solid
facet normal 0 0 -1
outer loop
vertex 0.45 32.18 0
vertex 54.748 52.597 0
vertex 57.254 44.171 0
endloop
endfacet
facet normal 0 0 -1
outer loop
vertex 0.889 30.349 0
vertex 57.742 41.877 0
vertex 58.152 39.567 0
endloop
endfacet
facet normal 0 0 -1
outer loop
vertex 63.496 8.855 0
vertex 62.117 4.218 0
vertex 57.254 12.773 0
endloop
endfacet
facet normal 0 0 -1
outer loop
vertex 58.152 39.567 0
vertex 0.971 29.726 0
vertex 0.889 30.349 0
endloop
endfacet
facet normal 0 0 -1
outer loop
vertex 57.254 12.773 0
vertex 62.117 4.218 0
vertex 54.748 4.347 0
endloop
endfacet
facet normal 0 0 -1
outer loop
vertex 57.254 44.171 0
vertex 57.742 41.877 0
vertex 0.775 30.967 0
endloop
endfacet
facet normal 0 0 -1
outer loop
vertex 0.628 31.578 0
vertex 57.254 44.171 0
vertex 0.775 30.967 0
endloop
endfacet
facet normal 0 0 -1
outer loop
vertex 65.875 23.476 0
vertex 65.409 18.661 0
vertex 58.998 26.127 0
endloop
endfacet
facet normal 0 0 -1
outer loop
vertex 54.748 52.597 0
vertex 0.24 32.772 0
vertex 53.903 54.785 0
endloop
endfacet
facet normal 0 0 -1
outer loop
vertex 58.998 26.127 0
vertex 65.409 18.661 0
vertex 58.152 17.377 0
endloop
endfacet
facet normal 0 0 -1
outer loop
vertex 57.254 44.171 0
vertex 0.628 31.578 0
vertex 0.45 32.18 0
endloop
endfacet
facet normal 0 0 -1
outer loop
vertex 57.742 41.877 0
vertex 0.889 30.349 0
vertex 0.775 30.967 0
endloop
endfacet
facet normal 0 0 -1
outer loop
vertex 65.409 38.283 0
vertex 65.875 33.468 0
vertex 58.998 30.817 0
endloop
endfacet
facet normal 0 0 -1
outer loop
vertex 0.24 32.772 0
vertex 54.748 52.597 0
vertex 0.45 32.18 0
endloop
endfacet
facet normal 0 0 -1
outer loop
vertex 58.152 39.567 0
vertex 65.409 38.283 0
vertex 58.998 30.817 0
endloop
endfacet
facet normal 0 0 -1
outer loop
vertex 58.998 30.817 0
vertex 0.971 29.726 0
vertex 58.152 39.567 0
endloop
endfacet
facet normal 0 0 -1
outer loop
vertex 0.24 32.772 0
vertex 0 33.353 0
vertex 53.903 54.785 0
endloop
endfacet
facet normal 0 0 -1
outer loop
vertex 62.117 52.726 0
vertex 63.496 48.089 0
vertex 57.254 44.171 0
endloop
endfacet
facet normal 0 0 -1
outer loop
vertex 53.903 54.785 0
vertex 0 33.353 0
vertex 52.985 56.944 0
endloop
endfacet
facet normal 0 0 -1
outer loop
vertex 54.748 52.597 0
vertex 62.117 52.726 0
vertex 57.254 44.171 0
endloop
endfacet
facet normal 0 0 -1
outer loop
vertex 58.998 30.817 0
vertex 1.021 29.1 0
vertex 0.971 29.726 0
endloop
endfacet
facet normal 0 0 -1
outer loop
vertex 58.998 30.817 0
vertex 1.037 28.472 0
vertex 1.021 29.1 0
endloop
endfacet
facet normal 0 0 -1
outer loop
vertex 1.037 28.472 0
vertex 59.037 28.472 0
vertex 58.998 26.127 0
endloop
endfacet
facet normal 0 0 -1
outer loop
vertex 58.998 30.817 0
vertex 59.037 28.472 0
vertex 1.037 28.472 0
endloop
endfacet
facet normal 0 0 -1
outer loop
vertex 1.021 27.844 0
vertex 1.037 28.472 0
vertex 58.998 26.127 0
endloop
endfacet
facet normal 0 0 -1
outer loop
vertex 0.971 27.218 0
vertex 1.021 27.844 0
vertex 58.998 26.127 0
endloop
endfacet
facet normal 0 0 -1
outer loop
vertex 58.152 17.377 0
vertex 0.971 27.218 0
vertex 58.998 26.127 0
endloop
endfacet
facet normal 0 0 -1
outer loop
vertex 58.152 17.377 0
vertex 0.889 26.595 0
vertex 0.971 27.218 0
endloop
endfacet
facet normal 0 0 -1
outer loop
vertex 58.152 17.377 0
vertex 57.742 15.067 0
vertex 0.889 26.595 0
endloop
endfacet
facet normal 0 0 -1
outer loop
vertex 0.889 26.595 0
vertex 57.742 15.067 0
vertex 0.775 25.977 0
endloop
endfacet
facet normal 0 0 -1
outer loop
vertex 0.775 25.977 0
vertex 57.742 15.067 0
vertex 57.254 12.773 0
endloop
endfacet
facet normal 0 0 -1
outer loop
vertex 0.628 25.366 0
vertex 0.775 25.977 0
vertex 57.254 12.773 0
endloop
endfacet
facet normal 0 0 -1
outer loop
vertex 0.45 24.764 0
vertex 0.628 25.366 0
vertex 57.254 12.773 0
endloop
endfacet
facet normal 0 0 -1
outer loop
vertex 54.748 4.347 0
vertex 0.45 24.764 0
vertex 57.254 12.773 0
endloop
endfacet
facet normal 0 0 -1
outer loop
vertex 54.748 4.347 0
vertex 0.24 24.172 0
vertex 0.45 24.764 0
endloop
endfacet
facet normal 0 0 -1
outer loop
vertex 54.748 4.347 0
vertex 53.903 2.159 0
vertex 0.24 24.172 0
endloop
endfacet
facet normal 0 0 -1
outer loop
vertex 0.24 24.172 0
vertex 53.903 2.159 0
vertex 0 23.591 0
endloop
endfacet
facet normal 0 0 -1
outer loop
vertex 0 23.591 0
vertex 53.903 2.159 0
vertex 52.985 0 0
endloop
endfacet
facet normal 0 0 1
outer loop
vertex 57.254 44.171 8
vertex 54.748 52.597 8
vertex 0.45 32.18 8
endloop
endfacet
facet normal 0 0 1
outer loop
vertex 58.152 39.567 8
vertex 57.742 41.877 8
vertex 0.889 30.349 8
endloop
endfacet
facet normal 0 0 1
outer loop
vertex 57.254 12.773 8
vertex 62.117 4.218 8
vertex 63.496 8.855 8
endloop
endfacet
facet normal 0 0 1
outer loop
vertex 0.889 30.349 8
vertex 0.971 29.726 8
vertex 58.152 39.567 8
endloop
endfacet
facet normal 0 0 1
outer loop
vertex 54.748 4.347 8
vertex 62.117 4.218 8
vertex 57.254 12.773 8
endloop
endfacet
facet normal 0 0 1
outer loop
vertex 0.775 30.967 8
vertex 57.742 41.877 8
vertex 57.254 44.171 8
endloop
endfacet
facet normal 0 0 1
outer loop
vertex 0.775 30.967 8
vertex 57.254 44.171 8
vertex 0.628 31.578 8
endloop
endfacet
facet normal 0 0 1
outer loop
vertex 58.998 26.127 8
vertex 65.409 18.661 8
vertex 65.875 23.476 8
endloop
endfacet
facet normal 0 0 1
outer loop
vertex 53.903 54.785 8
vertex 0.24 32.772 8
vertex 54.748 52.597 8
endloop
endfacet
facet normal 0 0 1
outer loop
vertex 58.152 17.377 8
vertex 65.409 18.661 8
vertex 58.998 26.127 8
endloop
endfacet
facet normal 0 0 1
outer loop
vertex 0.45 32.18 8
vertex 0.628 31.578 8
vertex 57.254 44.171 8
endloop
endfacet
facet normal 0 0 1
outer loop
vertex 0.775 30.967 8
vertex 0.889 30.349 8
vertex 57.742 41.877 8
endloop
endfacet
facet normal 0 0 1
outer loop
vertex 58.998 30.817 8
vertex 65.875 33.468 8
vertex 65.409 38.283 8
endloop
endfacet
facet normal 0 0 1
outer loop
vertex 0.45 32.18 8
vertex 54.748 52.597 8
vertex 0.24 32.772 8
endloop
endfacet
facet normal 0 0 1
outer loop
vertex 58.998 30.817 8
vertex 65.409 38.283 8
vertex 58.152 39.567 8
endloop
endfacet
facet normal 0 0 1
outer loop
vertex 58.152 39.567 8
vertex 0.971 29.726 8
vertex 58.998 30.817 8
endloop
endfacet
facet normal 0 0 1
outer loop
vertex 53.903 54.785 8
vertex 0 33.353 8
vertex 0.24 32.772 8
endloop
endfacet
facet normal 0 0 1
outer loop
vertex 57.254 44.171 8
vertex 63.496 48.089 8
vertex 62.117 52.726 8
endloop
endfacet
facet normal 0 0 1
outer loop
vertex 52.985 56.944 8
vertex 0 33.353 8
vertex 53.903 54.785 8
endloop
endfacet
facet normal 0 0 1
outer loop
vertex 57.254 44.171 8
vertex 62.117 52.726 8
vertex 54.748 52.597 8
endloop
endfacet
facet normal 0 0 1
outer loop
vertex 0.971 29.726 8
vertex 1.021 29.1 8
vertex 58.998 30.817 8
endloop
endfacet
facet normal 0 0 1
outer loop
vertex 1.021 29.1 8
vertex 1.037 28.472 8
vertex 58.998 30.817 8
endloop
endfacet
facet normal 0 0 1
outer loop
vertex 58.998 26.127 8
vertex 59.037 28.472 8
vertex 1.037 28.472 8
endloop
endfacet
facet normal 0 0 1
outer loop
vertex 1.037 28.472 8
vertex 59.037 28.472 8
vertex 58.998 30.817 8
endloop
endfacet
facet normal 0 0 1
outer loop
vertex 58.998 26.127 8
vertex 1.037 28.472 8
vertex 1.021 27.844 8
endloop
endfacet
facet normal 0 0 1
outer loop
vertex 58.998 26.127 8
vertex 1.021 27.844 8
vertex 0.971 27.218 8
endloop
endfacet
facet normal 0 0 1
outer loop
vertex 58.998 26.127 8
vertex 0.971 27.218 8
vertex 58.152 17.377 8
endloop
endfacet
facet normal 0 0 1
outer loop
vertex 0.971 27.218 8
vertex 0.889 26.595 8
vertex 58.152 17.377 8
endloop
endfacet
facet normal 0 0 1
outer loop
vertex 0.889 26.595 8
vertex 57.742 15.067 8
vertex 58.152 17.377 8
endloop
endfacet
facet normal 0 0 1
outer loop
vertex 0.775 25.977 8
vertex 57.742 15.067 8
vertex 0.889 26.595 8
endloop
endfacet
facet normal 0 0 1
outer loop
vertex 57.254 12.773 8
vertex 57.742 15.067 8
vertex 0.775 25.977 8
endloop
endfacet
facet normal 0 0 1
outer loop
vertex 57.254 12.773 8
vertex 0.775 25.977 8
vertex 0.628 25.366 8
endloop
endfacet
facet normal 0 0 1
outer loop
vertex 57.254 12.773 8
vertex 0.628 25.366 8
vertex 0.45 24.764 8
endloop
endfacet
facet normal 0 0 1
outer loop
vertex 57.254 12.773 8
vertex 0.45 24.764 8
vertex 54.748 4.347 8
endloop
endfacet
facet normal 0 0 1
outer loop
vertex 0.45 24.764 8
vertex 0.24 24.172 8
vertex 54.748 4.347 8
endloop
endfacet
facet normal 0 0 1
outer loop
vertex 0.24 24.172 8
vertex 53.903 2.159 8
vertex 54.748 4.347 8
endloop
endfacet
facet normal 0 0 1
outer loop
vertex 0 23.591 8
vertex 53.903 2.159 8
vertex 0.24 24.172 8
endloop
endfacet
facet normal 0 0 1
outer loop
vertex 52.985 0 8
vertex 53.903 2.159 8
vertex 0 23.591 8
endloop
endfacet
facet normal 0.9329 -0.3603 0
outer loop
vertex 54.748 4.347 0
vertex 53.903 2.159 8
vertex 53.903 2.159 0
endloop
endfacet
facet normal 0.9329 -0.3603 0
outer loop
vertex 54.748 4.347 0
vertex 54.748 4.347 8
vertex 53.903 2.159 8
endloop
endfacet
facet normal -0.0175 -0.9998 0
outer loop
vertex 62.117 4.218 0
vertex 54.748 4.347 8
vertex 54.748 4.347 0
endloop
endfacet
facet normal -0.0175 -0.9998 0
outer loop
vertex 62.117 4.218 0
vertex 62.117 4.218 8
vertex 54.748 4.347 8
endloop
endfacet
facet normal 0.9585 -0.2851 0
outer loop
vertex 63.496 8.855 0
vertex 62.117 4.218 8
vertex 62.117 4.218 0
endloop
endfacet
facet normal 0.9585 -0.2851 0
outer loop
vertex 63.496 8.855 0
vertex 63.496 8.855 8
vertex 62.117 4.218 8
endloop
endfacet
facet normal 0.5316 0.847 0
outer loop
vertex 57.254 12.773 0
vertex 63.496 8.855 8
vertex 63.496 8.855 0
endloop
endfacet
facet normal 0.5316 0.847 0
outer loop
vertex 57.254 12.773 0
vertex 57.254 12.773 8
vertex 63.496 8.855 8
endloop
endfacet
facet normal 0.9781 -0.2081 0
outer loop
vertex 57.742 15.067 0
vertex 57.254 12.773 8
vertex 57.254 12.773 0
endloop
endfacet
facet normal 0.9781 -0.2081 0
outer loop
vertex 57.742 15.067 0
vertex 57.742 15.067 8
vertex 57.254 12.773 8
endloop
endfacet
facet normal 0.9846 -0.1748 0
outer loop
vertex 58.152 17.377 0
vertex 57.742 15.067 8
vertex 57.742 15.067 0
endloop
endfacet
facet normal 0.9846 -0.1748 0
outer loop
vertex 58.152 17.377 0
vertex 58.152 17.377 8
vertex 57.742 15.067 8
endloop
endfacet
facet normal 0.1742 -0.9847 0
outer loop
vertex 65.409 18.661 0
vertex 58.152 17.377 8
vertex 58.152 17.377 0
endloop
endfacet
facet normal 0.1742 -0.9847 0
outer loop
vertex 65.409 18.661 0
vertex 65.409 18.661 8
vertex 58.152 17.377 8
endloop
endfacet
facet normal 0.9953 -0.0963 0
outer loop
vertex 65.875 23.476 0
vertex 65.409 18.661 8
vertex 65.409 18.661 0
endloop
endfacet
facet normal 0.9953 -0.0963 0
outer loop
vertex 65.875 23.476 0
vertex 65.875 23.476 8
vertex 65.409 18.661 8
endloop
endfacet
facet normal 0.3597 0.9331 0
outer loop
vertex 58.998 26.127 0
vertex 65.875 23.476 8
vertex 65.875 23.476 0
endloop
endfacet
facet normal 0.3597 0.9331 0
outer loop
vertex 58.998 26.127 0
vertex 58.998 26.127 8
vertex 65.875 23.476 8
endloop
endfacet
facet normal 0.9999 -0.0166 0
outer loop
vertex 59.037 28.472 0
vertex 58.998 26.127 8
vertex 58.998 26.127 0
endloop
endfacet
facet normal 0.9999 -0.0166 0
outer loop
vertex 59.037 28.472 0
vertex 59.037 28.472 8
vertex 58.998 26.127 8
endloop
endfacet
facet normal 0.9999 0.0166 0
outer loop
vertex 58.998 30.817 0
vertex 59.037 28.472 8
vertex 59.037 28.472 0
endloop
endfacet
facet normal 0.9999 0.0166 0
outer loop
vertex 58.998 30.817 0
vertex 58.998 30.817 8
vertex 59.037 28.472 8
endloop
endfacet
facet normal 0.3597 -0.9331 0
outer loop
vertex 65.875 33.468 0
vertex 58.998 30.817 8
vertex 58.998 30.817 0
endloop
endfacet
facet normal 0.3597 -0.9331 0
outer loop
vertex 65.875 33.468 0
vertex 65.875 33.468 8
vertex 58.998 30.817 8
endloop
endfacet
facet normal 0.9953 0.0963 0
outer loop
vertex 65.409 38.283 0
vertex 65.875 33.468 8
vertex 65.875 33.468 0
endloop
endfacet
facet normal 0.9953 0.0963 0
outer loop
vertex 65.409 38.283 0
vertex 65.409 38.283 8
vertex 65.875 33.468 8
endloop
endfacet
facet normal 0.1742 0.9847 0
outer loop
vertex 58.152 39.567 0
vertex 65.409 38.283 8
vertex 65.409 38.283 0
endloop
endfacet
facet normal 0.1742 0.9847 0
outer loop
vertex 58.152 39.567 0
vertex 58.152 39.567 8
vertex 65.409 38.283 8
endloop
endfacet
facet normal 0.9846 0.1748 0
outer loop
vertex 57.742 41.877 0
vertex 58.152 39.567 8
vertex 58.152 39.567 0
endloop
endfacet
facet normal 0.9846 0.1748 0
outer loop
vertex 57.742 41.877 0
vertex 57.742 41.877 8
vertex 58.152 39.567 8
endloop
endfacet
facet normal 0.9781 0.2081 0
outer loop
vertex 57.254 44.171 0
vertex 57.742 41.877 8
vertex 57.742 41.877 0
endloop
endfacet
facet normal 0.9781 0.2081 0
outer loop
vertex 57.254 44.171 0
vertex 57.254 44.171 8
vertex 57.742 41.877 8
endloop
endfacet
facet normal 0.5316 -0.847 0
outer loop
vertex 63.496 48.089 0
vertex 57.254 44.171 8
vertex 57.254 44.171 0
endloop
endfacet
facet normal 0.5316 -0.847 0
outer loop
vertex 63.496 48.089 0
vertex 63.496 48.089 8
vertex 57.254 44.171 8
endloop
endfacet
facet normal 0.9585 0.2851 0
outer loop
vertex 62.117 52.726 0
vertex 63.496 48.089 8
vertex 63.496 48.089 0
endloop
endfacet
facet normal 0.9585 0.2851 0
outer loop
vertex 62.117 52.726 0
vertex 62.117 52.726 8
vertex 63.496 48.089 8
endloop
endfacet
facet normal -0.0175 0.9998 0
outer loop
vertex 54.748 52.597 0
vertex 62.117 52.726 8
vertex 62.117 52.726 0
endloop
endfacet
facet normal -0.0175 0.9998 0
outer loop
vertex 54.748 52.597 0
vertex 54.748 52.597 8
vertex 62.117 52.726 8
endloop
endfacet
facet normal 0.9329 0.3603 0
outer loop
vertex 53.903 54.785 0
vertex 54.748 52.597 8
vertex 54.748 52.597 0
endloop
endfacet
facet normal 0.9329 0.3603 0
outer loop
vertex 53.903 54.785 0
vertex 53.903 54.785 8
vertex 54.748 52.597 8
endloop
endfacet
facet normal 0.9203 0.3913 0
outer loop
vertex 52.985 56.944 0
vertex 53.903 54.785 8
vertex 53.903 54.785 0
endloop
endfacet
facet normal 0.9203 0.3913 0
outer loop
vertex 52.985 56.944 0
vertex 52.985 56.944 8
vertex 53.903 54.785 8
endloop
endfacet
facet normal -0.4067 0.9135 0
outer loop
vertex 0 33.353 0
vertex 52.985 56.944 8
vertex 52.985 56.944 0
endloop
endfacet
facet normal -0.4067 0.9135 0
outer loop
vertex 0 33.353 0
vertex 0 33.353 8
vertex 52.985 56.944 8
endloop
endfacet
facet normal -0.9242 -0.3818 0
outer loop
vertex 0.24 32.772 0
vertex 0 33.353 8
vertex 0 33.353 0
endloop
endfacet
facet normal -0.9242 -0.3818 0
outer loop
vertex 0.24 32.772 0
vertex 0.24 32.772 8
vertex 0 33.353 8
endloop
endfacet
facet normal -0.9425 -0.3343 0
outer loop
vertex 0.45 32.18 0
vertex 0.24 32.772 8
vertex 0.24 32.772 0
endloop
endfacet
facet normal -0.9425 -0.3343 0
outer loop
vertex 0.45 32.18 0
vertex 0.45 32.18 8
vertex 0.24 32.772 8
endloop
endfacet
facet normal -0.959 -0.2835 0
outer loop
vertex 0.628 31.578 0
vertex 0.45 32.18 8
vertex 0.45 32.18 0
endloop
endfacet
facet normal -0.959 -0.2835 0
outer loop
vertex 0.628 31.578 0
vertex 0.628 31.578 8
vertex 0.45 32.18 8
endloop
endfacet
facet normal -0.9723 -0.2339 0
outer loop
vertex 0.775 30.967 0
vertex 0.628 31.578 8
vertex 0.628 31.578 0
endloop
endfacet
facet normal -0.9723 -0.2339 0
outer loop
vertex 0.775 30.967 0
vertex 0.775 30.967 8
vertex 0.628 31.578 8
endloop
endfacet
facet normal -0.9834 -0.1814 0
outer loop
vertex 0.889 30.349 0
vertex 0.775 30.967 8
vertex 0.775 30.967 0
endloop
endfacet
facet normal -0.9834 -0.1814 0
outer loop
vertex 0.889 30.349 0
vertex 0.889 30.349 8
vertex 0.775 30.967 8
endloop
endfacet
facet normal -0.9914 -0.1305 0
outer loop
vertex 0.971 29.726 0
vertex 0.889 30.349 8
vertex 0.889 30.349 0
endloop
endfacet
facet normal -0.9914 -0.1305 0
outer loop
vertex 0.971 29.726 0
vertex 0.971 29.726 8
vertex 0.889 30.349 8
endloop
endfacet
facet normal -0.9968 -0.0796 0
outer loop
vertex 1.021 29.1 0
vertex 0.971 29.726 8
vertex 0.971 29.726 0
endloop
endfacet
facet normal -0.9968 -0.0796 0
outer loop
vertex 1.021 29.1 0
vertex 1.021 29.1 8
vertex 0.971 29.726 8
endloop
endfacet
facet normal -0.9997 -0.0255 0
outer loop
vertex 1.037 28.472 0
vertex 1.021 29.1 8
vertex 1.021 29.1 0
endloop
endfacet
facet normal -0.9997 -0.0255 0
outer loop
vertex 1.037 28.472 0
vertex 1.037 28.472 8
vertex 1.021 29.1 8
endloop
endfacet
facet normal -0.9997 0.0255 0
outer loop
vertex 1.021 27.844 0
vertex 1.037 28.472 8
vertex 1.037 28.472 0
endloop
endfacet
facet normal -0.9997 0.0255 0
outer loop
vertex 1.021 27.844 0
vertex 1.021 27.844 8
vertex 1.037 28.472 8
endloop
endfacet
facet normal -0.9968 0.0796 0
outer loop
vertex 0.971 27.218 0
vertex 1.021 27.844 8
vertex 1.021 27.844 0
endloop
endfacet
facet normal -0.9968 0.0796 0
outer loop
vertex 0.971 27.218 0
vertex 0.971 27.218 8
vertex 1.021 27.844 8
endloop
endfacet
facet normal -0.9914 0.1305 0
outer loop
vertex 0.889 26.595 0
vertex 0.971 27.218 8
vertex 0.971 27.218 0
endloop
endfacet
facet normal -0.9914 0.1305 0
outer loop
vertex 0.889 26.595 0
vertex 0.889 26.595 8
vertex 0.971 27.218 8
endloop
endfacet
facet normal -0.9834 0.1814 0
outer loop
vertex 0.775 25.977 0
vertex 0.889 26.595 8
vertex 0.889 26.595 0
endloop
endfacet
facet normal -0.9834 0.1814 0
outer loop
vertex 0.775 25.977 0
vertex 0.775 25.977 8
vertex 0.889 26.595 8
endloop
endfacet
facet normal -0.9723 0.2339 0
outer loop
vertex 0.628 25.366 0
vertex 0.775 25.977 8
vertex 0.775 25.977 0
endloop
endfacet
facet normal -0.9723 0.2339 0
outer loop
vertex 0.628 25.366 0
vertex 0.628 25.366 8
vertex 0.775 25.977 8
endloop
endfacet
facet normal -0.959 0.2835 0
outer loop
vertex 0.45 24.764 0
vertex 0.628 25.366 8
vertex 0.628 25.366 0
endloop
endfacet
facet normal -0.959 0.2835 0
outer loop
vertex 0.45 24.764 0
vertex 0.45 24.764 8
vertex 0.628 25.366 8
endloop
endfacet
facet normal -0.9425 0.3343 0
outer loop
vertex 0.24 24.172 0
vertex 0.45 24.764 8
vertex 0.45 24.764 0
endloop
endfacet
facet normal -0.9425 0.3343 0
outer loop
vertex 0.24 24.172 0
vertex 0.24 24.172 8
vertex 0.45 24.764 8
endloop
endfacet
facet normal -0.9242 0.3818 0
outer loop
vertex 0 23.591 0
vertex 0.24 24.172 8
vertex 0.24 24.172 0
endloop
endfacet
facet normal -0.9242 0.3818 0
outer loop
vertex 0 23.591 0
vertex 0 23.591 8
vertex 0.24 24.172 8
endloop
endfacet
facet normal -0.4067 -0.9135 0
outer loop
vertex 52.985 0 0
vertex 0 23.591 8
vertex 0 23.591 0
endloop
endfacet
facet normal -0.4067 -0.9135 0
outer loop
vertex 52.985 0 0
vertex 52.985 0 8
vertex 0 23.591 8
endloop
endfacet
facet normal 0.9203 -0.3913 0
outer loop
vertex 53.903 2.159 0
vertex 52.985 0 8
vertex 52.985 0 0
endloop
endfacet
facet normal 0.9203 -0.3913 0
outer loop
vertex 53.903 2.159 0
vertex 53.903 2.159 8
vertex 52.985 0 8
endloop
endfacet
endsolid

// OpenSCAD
$fn = 32;

// ----------------------------------------------------------------------
// Gear sector: 4 teeth on 48 degrees
// ----------------------------------------------------------------------

// --- parameters (mm) ---
sector_angle = 48;        // sector angle, degrees
root_r = 70;              // root circle radius
tooth_h = 7;              // tooth height over the root circle
teeth = 4;                // number of teeth on the sector
hub_r = 12;               // hub bore radius
plate_t = 8;              // sector thickness, Z
arc_step = 3;             // sampling step of the root/hub arcs, degrees

tip_r = root_r + tooth_h;  // tip circle radius

profile = [[52.985, 0], [53.903, 2.159], [54.748, 4.347], [62.117, 4.218], [63.496, 8.855], [57.254, 12.773], [57.742, 15.067], [58.152, 17.377], [65.409, 18.661], [65.875, 23.476], [58.998, 26.127], [59.037, 28.472], [58.998, 30.817], [65.875, 33.468], [65.409, 38.283], [58.152, 39.567], [57.742, 41.877], [57.254, 44.171], [63.496, 48.089], [62.117, 52.726], [54.748, 52.597], [53.903, 54.785], [52.985, 56.944], [0, 33.353], [0.24, 32.772], [0.45, 32.18], [0.628, 31.578], [0.775, 30.967], [0.889, 30.349], [0.971, 29.726], [1.021, 29.1], [1.037, 28.472], [1.021, 27.844], [0.971, 27.218], [0.889, 26.595], [0.775, 25.977], [0.628, 25.366], [0.45, 24.764], [0.24, 24.172], [0, 23.591]];  // primary outline, 40 points, counter clockwise

// --- the one profile operation ---
linear_extrude(height = plate_t) polygon(points = profile);
